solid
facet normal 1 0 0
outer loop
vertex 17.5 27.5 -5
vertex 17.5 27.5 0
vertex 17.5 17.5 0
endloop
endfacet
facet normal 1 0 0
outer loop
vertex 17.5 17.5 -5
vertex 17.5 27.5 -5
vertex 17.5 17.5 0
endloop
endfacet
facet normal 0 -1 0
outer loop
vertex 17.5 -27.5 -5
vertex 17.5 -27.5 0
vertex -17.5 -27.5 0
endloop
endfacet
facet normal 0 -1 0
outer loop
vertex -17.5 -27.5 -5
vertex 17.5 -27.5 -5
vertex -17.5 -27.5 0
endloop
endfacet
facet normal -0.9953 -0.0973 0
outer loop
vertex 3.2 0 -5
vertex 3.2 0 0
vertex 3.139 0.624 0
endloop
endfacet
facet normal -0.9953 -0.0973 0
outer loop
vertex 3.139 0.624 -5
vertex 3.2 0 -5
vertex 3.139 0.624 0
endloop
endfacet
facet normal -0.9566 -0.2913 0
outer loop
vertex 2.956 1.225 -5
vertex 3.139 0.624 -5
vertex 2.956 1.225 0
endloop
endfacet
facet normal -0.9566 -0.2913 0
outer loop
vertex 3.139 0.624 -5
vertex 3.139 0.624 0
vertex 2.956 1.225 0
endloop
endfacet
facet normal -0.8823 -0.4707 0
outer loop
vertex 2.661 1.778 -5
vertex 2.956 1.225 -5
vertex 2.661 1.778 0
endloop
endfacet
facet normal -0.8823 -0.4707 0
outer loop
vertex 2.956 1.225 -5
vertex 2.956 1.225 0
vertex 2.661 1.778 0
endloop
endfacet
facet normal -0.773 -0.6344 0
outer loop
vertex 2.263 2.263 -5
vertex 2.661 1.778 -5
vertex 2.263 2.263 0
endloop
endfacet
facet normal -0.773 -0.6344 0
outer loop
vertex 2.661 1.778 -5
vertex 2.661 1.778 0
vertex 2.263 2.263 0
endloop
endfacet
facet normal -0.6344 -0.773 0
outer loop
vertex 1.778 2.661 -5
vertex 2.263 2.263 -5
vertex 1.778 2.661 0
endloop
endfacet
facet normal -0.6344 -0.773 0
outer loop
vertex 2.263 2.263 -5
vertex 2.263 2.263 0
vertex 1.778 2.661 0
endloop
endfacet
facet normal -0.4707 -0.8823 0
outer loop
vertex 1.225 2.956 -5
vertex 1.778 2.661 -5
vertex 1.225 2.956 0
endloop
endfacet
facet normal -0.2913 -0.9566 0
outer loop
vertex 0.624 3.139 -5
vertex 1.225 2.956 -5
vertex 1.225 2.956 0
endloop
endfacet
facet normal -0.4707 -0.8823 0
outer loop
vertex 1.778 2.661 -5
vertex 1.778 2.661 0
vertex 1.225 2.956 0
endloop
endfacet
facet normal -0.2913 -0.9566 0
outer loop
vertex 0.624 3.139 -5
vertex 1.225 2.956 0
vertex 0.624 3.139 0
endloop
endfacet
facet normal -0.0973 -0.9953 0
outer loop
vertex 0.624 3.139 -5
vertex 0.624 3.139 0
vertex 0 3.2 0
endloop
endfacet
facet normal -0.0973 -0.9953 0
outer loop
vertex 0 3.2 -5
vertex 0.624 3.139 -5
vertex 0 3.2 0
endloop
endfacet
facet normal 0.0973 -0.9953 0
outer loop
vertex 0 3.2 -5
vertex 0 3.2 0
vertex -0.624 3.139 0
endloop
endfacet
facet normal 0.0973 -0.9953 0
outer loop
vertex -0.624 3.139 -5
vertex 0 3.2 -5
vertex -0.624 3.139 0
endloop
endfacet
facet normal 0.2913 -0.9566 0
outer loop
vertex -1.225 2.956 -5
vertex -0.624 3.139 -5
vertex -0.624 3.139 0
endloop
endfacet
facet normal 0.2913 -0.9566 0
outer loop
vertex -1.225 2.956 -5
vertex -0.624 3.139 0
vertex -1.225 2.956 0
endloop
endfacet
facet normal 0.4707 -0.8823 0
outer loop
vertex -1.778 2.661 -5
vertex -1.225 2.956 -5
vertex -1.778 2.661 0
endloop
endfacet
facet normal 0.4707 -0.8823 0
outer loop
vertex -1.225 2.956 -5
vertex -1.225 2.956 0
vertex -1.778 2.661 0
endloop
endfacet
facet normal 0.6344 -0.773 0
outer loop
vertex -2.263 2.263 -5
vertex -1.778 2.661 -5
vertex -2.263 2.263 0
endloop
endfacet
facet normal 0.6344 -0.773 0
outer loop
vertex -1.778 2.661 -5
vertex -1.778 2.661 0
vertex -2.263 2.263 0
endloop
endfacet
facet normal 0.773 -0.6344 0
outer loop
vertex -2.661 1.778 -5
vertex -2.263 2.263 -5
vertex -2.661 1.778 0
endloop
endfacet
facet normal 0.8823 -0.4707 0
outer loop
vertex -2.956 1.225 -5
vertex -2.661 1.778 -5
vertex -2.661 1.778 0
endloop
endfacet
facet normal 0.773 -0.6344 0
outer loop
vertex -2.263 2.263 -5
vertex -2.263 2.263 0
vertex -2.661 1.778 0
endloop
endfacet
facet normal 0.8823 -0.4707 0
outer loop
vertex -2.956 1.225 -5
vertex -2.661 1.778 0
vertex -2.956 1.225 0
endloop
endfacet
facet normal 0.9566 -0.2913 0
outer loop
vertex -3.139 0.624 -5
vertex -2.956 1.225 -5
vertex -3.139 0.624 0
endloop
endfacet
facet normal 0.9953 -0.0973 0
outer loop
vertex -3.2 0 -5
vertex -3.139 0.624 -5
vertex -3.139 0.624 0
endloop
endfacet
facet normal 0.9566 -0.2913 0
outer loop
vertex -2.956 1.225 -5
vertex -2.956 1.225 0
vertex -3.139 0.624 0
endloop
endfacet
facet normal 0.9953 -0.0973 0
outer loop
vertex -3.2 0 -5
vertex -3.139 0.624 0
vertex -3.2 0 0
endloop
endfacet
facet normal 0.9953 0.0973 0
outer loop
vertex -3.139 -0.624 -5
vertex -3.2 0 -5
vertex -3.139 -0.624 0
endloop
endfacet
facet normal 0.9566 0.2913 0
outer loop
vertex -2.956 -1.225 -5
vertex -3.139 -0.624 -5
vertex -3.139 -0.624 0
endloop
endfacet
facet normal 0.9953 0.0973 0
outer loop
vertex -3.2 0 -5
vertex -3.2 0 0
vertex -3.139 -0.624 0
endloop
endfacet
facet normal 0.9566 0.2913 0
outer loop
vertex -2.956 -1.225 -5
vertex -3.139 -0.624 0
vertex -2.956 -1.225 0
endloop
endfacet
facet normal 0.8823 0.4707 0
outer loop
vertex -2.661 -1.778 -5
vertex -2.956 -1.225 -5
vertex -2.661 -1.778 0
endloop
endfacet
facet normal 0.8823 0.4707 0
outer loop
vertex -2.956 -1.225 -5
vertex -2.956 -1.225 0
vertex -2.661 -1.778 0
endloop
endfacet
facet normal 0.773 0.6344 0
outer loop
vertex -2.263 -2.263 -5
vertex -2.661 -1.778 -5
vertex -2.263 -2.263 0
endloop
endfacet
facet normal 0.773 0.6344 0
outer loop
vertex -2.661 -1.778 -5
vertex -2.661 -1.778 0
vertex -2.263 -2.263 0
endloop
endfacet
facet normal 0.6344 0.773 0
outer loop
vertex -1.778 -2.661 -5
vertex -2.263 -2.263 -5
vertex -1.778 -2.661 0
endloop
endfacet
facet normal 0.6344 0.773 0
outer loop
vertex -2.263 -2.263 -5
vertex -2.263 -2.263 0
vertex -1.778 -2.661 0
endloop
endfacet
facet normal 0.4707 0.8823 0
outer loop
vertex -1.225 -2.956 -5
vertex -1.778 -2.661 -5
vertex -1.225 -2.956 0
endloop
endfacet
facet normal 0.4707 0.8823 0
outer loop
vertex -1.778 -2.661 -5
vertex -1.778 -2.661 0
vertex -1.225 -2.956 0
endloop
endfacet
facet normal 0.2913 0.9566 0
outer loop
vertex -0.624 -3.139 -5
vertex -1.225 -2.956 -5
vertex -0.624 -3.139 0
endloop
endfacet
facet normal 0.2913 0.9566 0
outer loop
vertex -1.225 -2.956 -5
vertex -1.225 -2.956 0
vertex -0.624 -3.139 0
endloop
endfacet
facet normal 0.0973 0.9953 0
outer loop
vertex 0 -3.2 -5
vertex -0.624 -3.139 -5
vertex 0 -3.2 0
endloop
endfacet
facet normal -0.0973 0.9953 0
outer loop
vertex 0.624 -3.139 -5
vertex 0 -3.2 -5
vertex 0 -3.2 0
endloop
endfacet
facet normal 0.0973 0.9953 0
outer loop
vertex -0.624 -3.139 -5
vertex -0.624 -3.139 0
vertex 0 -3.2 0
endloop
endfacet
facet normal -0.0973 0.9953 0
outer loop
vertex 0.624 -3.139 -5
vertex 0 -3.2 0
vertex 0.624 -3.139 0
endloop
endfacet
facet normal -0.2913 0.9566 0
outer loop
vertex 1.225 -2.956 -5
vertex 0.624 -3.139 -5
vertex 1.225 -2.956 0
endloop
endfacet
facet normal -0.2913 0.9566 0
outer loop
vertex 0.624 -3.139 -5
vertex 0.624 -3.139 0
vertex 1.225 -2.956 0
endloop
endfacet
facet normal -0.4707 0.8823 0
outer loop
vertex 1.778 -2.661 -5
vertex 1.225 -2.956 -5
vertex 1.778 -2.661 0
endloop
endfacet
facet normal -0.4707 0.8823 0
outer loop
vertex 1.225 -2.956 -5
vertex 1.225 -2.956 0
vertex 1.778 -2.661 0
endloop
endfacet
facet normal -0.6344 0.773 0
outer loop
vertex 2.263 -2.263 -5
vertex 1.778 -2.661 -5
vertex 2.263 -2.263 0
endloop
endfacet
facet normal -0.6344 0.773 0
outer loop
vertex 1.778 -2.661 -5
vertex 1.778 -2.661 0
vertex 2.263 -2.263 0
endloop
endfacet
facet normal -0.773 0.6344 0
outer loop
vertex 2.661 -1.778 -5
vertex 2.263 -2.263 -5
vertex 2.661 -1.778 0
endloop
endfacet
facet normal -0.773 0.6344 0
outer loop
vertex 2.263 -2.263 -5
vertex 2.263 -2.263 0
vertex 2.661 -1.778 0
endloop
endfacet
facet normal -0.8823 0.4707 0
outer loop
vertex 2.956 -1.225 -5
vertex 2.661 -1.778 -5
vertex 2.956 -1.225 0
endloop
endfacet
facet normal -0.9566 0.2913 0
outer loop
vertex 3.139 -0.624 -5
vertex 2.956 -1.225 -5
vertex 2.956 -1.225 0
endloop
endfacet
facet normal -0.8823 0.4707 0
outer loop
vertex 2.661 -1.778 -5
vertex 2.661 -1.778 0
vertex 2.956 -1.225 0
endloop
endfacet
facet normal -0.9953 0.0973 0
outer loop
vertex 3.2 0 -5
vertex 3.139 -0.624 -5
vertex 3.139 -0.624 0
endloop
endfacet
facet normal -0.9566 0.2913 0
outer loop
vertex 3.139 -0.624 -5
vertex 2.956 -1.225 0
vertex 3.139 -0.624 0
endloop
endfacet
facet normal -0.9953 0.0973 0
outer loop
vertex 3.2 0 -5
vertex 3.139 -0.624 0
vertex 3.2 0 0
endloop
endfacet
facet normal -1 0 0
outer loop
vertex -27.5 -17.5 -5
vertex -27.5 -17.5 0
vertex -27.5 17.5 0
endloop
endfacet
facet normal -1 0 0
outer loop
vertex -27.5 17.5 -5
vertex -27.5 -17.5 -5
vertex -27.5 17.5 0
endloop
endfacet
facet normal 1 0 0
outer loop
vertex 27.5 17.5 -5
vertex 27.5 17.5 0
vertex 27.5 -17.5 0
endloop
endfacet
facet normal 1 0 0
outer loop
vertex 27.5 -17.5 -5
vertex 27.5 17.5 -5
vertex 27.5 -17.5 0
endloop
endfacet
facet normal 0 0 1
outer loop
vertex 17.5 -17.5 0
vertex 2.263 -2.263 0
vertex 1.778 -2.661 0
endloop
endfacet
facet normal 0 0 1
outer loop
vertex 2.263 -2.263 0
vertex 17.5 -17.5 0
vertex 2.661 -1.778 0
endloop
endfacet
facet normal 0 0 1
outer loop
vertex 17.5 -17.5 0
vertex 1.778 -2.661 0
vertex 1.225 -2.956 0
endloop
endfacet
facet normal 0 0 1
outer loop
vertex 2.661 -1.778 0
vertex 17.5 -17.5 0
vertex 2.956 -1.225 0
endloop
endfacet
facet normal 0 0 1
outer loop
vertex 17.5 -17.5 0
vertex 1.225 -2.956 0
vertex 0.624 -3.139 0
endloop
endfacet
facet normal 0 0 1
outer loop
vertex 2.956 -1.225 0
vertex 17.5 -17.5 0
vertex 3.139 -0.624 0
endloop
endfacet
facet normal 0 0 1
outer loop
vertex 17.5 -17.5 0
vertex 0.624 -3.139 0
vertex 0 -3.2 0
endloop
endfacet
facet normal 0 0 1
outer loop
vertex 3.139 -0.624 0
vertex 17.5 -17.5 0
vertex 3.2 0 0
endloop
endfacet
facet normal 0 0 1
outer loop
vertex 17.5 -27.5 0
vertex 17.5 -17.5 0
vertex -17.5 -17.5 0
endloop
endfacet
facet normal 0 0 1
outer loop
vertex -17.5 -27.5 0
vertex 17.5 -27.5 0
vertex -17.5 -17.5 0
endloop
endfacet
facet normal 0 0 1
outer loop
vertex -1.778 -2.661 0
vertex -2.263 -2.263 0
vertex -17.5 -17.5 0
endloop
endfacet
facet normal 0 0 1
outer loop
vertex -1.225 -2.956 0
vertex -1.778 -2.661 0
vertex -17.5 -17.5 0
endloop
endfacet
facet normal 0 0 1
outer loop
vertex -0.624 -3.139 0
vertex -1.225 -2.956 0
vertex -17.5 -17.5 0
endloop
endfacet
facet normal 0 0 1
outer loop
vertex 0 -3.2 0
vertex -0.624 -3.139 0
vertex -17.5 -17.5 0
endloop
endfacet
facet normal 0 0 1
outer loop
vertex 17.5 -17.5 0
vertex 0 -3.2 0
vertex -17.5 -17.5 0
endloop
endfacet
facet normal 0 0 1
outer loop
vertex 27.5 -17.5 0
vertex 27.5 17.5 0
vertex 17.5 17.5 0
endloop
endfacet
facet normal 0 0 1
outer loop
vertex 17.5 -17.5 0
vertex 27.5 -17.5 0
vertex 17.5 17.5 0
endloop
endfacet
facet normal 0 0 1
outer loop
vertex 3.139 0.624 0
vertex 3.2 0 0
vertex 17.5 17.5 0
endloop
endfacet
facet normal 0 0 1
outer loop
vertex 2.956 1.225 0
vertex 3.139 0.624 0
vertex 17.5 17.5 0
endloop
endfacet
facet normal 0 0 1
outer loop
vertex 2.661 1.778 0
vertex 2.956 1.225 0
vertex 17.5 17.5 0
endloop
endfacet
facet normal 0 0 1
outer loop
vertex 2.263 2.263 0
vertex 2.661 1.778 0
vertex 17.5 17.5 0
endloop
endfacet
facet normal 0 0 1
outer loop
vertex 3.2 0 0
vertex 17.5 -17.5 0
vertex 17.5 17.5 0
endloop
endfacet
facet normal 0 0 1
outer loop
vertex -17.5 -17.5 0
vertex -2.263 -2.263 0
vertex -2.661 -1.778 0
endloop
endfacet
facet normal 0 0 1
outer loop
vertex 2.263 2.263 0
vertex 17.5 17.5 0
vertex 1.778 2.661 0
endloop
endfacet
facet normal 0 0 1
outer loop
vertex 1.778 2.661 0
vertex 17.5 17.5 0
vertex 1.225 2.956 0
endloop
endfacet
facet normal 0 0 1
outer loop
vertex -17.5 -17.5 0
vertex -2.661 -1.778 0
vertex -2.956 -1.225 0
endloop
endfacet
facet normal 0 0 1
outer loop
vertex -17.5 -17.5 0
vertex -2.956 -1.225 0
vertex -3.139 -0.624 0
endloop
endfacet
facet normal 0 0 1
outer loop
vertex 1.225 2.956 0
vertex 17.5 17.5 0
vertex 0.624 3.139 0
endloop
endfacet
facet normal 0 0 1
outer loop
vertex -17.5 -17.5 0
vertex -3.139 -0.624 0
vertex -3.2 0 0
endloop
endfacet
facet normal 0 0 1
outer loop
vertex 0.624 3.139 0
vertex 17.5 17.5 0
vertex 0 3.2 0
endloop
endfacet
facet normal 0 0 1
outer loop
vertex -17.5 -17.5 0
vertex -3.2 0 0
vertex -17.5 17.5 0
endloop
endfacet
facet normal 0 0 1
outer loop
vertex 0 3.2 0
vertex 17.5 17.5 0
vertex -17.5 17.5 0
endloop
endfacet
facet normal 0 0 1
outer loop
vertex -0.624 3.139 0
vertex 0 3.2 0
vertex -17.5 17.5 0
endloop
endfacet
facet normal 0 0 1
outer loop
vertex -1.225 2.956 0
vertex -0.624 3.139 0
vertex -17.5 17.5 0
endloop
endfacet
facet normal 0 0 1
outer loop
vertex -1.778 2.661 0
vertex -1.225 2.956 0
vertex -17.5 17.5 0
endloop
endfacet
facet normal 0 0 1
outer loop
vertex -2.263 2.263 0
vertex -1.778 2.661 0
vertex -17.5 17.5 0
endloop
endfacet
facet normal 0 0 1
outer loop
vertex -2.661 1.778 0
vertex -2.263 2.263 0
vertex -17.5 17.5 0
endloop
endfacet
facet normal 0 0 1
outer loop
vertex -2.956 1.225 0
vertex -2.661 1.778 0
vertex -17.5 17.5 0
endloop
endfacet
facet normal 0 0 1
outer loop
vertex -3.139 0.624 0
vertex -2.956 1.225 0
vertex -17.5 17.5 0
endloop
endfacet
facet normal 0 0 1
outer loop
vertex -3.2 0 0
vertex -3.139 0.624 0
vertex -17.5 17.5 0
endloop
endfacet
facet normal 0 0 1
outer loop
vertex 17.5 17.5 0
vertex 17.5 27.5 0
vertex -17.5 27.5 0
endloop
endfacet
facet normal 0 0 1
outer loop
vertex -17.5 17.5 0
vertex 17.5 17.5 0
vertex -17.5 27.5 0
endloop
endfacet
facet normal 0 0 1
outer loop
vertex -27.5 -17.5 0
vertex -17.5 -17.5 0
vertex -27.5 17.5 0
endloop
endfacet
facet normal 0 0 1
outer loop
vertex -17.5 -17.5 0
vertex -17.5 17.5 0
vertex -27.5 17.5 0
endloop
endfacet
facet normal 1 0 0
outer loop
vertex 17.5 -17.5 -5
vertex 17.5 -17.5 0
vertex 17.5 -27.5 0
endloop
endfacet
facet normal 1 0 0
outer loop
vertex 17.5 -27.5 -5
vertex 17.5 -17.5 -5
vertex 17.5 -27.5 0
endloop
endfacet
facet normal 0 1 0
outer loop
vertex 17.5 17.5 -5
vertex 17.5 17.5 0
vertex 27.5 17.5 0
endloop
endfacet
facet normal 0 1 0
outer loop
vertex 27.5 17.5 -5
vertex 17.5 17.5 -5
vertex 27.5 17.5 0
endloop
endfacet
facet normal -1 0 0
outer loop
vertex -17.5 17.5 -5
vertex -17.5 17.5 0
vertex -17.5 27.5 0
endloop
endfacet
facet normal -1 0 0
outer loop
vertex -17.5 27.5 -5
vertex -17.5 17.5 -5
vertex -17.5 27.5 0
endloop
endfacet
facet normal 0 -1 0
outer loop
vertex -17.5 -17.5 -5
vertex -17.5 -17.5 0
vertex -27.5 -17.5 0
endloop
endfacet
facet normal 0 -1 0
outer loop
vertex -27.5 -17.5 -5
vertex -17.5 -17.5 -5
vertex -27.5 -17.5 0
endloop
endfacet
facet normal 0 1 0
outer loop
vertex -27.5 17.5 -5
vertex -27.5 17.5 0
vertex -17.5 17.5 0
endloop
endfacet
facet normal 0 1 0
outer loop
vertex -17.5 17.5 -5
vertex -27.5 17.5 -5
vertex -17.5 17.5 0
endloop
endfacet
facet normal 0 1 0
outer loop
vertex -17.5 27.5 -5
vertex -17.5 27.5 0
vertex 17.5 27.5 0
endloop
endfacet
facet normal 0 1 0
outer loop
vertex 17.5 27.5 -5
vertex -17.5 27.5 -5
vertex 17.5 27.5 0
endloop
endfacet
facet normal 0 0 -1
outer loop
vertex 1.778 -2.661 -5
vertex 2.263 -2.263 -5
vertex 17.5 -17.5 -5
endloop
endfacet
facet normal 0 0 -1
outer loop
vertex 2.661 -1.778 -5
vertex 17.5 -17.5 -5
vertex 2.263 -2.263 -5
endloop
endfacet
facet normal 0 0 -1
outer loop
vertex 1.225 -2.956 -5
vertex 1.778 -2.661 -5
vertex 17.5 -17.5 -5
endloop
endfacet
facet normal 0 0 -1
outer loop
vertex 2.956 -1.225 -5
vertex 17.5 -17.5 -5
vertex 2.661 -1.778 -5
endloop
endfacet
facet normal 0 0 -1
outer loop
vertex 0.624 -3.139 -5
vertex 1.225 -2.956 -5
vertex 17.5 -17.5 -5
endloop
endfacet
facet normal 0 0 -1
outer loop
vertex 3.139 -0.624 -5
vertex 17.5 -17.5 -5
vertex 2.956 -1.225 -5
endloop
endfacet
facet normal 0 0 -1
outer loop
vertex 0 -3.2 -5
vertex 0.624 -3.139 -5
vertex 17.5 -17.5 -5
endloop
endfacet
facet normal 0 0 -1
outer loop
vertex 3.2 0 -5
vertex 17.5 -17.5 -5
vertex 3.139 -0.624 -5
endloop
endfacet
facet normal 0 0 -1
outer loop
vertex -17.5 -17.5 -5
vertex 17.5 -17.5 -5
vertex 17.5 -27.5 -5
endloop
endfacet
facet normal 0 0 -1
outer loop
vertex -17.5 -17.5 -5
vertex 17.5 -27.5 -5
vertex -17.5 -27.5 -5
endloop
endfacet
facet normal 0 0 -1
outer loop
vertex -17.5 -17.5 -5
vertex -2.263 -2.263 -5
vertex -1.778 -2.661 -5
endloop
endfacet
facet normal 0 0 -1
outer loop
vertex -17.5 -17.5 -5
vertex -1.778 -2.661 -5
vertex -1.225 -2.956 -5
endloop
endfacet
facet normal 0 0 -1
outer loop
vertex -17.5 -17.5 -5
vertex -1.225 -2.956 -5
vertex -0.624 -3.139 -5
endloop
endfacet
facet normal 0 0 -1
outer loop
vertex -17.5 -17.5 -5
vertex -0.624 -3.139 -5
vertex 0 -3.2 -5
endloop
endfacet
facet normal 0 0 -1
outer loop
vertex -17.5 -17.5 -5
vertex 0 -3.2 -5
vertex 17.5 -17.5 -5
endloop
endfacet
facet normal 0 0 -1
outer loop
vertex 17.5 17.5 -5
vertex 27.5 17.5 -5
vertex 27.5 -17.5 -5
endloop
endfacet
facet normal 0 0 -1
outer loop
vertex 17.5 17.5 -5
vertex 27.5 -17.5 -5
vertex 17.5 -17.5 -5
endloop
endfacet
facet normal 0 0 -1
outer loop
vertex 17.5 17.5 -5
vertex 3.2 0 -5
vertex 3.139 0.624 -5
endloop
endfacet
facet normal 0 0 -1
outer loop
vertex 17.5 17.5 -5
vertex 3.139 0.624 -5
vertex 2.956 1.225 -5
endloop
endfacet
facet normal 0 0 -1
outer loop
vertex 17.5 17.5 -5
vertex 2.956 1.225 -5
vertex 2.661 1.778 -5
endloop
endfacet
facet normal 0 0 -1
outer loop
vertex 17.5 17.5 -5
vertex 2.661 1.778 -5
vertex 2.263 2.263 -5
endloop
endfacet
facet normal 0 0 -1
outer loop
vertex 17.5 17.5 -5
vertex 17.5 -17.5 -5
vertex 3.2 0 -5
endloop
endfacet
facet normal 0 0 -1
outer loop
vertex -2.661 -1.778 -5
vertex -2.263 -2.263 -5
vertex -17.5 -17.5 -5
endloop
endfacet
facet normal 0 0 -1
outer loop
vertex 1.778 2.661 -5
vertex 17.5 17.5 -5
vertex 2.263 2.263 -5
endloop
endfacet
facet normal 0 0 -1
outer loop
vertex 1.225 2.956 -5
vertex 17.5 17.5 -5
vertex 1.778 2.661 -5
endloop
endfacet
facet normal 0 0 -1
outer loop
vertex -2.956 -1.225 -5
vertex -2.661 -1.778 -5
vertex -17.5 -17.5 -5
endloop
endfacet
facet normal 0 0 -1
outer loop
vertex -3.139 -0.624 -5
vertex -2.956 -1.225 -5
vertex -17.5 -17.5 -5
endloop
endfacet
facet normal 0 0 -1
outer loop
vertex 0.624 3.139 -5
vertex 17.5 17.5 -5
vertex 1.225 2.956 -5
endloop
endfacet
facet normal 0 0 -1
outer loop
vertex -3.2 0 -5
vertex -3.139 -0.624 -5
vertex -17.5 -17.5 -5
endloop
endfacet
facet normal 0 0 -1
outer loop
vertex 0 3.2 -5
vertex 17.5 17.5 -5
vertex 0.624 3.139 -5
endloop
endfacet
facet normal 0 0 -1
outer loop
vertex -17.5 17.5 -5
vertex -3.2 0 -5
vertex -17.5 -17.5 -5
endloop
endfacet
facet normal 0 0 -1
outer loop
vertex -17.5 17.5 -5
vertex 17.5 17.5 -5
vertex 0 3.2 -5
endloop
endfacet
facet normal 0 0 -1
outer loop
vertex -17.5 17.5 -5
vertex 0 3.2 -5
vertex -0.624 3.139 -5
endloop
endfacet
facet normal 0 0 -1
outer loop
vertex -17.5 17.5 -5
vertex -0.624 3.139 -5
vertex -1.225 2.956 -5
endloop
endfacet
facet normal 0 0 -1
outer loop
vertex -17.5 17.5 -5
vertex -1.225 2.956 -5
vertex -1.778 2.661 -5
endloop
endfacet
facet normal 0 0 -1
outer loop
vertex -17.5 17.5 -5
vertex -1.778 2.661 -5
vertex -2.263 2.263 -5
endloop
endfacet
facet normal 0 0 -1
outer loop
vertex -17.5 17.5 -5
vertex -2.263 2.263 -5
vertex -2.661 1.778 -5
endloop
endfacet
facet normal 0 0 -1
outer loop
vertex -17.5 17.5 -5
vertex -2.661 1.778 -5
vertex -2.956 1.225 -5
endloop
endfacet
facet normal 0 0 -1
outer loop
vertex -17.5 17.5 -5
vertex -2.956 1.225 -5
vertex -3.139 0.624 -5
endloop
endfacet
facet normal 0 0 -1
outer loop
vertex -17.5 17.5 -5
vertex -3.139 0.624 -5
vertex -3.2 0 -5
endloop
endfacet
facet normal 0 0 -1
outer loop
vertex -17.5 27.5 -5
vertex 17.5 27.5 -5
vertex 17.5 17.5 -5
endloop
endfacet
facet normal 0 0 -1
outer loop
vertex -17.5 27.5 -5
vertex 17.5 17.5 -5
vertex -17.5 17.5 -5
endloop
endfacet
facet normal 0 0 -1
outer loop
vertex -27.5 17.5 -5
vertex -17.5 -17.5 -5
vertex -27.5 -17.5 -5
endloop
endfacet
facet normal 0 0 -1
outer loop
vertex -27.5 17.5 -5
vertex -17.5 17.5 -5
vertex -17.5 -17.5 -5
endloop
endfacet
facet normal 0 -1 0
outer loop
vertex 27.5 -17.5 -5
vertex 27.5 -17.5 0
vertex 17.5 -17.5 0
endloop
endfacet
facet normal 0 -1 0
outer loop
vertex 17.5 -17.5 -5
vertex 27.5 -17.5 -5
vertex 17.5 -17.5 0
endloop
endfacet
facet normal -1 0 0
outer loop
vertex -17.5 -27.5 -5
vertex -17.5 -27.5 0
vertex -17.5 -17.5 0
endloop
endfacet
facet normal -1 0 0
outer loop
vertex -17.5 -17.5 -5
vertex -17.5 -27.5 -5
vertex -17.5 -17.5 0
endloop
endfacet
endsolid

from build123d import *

# Parameters (mm, degrees)
SKETCH1_R           = 3.2
BOSS_EXTRUDE1_DEPTH = 5


with BuildPart() as part:
    # Sketch1 → Boss-Extrude1 (new body)
    with BuildSketch(Plane.XY):
        Polygon((-17.5, 27.5), (17.5, 27.5), (17.5, 17.5), (27.5, 17.5), (27.5, -17.5), (17.5, -17.5), (17.5, -27.5), (-17.5, -27.5), (-17.5, -17.5), (-27.5, -17.5), (-27.5, 17.5), (-17.5, 17.5), align=None)
        Circle(SKETCH1_R, mode=Mode.SUBTRACT)
    extrude(amount=-BOSS_EXTRUDE1_DEPTH)


solid = part.part
